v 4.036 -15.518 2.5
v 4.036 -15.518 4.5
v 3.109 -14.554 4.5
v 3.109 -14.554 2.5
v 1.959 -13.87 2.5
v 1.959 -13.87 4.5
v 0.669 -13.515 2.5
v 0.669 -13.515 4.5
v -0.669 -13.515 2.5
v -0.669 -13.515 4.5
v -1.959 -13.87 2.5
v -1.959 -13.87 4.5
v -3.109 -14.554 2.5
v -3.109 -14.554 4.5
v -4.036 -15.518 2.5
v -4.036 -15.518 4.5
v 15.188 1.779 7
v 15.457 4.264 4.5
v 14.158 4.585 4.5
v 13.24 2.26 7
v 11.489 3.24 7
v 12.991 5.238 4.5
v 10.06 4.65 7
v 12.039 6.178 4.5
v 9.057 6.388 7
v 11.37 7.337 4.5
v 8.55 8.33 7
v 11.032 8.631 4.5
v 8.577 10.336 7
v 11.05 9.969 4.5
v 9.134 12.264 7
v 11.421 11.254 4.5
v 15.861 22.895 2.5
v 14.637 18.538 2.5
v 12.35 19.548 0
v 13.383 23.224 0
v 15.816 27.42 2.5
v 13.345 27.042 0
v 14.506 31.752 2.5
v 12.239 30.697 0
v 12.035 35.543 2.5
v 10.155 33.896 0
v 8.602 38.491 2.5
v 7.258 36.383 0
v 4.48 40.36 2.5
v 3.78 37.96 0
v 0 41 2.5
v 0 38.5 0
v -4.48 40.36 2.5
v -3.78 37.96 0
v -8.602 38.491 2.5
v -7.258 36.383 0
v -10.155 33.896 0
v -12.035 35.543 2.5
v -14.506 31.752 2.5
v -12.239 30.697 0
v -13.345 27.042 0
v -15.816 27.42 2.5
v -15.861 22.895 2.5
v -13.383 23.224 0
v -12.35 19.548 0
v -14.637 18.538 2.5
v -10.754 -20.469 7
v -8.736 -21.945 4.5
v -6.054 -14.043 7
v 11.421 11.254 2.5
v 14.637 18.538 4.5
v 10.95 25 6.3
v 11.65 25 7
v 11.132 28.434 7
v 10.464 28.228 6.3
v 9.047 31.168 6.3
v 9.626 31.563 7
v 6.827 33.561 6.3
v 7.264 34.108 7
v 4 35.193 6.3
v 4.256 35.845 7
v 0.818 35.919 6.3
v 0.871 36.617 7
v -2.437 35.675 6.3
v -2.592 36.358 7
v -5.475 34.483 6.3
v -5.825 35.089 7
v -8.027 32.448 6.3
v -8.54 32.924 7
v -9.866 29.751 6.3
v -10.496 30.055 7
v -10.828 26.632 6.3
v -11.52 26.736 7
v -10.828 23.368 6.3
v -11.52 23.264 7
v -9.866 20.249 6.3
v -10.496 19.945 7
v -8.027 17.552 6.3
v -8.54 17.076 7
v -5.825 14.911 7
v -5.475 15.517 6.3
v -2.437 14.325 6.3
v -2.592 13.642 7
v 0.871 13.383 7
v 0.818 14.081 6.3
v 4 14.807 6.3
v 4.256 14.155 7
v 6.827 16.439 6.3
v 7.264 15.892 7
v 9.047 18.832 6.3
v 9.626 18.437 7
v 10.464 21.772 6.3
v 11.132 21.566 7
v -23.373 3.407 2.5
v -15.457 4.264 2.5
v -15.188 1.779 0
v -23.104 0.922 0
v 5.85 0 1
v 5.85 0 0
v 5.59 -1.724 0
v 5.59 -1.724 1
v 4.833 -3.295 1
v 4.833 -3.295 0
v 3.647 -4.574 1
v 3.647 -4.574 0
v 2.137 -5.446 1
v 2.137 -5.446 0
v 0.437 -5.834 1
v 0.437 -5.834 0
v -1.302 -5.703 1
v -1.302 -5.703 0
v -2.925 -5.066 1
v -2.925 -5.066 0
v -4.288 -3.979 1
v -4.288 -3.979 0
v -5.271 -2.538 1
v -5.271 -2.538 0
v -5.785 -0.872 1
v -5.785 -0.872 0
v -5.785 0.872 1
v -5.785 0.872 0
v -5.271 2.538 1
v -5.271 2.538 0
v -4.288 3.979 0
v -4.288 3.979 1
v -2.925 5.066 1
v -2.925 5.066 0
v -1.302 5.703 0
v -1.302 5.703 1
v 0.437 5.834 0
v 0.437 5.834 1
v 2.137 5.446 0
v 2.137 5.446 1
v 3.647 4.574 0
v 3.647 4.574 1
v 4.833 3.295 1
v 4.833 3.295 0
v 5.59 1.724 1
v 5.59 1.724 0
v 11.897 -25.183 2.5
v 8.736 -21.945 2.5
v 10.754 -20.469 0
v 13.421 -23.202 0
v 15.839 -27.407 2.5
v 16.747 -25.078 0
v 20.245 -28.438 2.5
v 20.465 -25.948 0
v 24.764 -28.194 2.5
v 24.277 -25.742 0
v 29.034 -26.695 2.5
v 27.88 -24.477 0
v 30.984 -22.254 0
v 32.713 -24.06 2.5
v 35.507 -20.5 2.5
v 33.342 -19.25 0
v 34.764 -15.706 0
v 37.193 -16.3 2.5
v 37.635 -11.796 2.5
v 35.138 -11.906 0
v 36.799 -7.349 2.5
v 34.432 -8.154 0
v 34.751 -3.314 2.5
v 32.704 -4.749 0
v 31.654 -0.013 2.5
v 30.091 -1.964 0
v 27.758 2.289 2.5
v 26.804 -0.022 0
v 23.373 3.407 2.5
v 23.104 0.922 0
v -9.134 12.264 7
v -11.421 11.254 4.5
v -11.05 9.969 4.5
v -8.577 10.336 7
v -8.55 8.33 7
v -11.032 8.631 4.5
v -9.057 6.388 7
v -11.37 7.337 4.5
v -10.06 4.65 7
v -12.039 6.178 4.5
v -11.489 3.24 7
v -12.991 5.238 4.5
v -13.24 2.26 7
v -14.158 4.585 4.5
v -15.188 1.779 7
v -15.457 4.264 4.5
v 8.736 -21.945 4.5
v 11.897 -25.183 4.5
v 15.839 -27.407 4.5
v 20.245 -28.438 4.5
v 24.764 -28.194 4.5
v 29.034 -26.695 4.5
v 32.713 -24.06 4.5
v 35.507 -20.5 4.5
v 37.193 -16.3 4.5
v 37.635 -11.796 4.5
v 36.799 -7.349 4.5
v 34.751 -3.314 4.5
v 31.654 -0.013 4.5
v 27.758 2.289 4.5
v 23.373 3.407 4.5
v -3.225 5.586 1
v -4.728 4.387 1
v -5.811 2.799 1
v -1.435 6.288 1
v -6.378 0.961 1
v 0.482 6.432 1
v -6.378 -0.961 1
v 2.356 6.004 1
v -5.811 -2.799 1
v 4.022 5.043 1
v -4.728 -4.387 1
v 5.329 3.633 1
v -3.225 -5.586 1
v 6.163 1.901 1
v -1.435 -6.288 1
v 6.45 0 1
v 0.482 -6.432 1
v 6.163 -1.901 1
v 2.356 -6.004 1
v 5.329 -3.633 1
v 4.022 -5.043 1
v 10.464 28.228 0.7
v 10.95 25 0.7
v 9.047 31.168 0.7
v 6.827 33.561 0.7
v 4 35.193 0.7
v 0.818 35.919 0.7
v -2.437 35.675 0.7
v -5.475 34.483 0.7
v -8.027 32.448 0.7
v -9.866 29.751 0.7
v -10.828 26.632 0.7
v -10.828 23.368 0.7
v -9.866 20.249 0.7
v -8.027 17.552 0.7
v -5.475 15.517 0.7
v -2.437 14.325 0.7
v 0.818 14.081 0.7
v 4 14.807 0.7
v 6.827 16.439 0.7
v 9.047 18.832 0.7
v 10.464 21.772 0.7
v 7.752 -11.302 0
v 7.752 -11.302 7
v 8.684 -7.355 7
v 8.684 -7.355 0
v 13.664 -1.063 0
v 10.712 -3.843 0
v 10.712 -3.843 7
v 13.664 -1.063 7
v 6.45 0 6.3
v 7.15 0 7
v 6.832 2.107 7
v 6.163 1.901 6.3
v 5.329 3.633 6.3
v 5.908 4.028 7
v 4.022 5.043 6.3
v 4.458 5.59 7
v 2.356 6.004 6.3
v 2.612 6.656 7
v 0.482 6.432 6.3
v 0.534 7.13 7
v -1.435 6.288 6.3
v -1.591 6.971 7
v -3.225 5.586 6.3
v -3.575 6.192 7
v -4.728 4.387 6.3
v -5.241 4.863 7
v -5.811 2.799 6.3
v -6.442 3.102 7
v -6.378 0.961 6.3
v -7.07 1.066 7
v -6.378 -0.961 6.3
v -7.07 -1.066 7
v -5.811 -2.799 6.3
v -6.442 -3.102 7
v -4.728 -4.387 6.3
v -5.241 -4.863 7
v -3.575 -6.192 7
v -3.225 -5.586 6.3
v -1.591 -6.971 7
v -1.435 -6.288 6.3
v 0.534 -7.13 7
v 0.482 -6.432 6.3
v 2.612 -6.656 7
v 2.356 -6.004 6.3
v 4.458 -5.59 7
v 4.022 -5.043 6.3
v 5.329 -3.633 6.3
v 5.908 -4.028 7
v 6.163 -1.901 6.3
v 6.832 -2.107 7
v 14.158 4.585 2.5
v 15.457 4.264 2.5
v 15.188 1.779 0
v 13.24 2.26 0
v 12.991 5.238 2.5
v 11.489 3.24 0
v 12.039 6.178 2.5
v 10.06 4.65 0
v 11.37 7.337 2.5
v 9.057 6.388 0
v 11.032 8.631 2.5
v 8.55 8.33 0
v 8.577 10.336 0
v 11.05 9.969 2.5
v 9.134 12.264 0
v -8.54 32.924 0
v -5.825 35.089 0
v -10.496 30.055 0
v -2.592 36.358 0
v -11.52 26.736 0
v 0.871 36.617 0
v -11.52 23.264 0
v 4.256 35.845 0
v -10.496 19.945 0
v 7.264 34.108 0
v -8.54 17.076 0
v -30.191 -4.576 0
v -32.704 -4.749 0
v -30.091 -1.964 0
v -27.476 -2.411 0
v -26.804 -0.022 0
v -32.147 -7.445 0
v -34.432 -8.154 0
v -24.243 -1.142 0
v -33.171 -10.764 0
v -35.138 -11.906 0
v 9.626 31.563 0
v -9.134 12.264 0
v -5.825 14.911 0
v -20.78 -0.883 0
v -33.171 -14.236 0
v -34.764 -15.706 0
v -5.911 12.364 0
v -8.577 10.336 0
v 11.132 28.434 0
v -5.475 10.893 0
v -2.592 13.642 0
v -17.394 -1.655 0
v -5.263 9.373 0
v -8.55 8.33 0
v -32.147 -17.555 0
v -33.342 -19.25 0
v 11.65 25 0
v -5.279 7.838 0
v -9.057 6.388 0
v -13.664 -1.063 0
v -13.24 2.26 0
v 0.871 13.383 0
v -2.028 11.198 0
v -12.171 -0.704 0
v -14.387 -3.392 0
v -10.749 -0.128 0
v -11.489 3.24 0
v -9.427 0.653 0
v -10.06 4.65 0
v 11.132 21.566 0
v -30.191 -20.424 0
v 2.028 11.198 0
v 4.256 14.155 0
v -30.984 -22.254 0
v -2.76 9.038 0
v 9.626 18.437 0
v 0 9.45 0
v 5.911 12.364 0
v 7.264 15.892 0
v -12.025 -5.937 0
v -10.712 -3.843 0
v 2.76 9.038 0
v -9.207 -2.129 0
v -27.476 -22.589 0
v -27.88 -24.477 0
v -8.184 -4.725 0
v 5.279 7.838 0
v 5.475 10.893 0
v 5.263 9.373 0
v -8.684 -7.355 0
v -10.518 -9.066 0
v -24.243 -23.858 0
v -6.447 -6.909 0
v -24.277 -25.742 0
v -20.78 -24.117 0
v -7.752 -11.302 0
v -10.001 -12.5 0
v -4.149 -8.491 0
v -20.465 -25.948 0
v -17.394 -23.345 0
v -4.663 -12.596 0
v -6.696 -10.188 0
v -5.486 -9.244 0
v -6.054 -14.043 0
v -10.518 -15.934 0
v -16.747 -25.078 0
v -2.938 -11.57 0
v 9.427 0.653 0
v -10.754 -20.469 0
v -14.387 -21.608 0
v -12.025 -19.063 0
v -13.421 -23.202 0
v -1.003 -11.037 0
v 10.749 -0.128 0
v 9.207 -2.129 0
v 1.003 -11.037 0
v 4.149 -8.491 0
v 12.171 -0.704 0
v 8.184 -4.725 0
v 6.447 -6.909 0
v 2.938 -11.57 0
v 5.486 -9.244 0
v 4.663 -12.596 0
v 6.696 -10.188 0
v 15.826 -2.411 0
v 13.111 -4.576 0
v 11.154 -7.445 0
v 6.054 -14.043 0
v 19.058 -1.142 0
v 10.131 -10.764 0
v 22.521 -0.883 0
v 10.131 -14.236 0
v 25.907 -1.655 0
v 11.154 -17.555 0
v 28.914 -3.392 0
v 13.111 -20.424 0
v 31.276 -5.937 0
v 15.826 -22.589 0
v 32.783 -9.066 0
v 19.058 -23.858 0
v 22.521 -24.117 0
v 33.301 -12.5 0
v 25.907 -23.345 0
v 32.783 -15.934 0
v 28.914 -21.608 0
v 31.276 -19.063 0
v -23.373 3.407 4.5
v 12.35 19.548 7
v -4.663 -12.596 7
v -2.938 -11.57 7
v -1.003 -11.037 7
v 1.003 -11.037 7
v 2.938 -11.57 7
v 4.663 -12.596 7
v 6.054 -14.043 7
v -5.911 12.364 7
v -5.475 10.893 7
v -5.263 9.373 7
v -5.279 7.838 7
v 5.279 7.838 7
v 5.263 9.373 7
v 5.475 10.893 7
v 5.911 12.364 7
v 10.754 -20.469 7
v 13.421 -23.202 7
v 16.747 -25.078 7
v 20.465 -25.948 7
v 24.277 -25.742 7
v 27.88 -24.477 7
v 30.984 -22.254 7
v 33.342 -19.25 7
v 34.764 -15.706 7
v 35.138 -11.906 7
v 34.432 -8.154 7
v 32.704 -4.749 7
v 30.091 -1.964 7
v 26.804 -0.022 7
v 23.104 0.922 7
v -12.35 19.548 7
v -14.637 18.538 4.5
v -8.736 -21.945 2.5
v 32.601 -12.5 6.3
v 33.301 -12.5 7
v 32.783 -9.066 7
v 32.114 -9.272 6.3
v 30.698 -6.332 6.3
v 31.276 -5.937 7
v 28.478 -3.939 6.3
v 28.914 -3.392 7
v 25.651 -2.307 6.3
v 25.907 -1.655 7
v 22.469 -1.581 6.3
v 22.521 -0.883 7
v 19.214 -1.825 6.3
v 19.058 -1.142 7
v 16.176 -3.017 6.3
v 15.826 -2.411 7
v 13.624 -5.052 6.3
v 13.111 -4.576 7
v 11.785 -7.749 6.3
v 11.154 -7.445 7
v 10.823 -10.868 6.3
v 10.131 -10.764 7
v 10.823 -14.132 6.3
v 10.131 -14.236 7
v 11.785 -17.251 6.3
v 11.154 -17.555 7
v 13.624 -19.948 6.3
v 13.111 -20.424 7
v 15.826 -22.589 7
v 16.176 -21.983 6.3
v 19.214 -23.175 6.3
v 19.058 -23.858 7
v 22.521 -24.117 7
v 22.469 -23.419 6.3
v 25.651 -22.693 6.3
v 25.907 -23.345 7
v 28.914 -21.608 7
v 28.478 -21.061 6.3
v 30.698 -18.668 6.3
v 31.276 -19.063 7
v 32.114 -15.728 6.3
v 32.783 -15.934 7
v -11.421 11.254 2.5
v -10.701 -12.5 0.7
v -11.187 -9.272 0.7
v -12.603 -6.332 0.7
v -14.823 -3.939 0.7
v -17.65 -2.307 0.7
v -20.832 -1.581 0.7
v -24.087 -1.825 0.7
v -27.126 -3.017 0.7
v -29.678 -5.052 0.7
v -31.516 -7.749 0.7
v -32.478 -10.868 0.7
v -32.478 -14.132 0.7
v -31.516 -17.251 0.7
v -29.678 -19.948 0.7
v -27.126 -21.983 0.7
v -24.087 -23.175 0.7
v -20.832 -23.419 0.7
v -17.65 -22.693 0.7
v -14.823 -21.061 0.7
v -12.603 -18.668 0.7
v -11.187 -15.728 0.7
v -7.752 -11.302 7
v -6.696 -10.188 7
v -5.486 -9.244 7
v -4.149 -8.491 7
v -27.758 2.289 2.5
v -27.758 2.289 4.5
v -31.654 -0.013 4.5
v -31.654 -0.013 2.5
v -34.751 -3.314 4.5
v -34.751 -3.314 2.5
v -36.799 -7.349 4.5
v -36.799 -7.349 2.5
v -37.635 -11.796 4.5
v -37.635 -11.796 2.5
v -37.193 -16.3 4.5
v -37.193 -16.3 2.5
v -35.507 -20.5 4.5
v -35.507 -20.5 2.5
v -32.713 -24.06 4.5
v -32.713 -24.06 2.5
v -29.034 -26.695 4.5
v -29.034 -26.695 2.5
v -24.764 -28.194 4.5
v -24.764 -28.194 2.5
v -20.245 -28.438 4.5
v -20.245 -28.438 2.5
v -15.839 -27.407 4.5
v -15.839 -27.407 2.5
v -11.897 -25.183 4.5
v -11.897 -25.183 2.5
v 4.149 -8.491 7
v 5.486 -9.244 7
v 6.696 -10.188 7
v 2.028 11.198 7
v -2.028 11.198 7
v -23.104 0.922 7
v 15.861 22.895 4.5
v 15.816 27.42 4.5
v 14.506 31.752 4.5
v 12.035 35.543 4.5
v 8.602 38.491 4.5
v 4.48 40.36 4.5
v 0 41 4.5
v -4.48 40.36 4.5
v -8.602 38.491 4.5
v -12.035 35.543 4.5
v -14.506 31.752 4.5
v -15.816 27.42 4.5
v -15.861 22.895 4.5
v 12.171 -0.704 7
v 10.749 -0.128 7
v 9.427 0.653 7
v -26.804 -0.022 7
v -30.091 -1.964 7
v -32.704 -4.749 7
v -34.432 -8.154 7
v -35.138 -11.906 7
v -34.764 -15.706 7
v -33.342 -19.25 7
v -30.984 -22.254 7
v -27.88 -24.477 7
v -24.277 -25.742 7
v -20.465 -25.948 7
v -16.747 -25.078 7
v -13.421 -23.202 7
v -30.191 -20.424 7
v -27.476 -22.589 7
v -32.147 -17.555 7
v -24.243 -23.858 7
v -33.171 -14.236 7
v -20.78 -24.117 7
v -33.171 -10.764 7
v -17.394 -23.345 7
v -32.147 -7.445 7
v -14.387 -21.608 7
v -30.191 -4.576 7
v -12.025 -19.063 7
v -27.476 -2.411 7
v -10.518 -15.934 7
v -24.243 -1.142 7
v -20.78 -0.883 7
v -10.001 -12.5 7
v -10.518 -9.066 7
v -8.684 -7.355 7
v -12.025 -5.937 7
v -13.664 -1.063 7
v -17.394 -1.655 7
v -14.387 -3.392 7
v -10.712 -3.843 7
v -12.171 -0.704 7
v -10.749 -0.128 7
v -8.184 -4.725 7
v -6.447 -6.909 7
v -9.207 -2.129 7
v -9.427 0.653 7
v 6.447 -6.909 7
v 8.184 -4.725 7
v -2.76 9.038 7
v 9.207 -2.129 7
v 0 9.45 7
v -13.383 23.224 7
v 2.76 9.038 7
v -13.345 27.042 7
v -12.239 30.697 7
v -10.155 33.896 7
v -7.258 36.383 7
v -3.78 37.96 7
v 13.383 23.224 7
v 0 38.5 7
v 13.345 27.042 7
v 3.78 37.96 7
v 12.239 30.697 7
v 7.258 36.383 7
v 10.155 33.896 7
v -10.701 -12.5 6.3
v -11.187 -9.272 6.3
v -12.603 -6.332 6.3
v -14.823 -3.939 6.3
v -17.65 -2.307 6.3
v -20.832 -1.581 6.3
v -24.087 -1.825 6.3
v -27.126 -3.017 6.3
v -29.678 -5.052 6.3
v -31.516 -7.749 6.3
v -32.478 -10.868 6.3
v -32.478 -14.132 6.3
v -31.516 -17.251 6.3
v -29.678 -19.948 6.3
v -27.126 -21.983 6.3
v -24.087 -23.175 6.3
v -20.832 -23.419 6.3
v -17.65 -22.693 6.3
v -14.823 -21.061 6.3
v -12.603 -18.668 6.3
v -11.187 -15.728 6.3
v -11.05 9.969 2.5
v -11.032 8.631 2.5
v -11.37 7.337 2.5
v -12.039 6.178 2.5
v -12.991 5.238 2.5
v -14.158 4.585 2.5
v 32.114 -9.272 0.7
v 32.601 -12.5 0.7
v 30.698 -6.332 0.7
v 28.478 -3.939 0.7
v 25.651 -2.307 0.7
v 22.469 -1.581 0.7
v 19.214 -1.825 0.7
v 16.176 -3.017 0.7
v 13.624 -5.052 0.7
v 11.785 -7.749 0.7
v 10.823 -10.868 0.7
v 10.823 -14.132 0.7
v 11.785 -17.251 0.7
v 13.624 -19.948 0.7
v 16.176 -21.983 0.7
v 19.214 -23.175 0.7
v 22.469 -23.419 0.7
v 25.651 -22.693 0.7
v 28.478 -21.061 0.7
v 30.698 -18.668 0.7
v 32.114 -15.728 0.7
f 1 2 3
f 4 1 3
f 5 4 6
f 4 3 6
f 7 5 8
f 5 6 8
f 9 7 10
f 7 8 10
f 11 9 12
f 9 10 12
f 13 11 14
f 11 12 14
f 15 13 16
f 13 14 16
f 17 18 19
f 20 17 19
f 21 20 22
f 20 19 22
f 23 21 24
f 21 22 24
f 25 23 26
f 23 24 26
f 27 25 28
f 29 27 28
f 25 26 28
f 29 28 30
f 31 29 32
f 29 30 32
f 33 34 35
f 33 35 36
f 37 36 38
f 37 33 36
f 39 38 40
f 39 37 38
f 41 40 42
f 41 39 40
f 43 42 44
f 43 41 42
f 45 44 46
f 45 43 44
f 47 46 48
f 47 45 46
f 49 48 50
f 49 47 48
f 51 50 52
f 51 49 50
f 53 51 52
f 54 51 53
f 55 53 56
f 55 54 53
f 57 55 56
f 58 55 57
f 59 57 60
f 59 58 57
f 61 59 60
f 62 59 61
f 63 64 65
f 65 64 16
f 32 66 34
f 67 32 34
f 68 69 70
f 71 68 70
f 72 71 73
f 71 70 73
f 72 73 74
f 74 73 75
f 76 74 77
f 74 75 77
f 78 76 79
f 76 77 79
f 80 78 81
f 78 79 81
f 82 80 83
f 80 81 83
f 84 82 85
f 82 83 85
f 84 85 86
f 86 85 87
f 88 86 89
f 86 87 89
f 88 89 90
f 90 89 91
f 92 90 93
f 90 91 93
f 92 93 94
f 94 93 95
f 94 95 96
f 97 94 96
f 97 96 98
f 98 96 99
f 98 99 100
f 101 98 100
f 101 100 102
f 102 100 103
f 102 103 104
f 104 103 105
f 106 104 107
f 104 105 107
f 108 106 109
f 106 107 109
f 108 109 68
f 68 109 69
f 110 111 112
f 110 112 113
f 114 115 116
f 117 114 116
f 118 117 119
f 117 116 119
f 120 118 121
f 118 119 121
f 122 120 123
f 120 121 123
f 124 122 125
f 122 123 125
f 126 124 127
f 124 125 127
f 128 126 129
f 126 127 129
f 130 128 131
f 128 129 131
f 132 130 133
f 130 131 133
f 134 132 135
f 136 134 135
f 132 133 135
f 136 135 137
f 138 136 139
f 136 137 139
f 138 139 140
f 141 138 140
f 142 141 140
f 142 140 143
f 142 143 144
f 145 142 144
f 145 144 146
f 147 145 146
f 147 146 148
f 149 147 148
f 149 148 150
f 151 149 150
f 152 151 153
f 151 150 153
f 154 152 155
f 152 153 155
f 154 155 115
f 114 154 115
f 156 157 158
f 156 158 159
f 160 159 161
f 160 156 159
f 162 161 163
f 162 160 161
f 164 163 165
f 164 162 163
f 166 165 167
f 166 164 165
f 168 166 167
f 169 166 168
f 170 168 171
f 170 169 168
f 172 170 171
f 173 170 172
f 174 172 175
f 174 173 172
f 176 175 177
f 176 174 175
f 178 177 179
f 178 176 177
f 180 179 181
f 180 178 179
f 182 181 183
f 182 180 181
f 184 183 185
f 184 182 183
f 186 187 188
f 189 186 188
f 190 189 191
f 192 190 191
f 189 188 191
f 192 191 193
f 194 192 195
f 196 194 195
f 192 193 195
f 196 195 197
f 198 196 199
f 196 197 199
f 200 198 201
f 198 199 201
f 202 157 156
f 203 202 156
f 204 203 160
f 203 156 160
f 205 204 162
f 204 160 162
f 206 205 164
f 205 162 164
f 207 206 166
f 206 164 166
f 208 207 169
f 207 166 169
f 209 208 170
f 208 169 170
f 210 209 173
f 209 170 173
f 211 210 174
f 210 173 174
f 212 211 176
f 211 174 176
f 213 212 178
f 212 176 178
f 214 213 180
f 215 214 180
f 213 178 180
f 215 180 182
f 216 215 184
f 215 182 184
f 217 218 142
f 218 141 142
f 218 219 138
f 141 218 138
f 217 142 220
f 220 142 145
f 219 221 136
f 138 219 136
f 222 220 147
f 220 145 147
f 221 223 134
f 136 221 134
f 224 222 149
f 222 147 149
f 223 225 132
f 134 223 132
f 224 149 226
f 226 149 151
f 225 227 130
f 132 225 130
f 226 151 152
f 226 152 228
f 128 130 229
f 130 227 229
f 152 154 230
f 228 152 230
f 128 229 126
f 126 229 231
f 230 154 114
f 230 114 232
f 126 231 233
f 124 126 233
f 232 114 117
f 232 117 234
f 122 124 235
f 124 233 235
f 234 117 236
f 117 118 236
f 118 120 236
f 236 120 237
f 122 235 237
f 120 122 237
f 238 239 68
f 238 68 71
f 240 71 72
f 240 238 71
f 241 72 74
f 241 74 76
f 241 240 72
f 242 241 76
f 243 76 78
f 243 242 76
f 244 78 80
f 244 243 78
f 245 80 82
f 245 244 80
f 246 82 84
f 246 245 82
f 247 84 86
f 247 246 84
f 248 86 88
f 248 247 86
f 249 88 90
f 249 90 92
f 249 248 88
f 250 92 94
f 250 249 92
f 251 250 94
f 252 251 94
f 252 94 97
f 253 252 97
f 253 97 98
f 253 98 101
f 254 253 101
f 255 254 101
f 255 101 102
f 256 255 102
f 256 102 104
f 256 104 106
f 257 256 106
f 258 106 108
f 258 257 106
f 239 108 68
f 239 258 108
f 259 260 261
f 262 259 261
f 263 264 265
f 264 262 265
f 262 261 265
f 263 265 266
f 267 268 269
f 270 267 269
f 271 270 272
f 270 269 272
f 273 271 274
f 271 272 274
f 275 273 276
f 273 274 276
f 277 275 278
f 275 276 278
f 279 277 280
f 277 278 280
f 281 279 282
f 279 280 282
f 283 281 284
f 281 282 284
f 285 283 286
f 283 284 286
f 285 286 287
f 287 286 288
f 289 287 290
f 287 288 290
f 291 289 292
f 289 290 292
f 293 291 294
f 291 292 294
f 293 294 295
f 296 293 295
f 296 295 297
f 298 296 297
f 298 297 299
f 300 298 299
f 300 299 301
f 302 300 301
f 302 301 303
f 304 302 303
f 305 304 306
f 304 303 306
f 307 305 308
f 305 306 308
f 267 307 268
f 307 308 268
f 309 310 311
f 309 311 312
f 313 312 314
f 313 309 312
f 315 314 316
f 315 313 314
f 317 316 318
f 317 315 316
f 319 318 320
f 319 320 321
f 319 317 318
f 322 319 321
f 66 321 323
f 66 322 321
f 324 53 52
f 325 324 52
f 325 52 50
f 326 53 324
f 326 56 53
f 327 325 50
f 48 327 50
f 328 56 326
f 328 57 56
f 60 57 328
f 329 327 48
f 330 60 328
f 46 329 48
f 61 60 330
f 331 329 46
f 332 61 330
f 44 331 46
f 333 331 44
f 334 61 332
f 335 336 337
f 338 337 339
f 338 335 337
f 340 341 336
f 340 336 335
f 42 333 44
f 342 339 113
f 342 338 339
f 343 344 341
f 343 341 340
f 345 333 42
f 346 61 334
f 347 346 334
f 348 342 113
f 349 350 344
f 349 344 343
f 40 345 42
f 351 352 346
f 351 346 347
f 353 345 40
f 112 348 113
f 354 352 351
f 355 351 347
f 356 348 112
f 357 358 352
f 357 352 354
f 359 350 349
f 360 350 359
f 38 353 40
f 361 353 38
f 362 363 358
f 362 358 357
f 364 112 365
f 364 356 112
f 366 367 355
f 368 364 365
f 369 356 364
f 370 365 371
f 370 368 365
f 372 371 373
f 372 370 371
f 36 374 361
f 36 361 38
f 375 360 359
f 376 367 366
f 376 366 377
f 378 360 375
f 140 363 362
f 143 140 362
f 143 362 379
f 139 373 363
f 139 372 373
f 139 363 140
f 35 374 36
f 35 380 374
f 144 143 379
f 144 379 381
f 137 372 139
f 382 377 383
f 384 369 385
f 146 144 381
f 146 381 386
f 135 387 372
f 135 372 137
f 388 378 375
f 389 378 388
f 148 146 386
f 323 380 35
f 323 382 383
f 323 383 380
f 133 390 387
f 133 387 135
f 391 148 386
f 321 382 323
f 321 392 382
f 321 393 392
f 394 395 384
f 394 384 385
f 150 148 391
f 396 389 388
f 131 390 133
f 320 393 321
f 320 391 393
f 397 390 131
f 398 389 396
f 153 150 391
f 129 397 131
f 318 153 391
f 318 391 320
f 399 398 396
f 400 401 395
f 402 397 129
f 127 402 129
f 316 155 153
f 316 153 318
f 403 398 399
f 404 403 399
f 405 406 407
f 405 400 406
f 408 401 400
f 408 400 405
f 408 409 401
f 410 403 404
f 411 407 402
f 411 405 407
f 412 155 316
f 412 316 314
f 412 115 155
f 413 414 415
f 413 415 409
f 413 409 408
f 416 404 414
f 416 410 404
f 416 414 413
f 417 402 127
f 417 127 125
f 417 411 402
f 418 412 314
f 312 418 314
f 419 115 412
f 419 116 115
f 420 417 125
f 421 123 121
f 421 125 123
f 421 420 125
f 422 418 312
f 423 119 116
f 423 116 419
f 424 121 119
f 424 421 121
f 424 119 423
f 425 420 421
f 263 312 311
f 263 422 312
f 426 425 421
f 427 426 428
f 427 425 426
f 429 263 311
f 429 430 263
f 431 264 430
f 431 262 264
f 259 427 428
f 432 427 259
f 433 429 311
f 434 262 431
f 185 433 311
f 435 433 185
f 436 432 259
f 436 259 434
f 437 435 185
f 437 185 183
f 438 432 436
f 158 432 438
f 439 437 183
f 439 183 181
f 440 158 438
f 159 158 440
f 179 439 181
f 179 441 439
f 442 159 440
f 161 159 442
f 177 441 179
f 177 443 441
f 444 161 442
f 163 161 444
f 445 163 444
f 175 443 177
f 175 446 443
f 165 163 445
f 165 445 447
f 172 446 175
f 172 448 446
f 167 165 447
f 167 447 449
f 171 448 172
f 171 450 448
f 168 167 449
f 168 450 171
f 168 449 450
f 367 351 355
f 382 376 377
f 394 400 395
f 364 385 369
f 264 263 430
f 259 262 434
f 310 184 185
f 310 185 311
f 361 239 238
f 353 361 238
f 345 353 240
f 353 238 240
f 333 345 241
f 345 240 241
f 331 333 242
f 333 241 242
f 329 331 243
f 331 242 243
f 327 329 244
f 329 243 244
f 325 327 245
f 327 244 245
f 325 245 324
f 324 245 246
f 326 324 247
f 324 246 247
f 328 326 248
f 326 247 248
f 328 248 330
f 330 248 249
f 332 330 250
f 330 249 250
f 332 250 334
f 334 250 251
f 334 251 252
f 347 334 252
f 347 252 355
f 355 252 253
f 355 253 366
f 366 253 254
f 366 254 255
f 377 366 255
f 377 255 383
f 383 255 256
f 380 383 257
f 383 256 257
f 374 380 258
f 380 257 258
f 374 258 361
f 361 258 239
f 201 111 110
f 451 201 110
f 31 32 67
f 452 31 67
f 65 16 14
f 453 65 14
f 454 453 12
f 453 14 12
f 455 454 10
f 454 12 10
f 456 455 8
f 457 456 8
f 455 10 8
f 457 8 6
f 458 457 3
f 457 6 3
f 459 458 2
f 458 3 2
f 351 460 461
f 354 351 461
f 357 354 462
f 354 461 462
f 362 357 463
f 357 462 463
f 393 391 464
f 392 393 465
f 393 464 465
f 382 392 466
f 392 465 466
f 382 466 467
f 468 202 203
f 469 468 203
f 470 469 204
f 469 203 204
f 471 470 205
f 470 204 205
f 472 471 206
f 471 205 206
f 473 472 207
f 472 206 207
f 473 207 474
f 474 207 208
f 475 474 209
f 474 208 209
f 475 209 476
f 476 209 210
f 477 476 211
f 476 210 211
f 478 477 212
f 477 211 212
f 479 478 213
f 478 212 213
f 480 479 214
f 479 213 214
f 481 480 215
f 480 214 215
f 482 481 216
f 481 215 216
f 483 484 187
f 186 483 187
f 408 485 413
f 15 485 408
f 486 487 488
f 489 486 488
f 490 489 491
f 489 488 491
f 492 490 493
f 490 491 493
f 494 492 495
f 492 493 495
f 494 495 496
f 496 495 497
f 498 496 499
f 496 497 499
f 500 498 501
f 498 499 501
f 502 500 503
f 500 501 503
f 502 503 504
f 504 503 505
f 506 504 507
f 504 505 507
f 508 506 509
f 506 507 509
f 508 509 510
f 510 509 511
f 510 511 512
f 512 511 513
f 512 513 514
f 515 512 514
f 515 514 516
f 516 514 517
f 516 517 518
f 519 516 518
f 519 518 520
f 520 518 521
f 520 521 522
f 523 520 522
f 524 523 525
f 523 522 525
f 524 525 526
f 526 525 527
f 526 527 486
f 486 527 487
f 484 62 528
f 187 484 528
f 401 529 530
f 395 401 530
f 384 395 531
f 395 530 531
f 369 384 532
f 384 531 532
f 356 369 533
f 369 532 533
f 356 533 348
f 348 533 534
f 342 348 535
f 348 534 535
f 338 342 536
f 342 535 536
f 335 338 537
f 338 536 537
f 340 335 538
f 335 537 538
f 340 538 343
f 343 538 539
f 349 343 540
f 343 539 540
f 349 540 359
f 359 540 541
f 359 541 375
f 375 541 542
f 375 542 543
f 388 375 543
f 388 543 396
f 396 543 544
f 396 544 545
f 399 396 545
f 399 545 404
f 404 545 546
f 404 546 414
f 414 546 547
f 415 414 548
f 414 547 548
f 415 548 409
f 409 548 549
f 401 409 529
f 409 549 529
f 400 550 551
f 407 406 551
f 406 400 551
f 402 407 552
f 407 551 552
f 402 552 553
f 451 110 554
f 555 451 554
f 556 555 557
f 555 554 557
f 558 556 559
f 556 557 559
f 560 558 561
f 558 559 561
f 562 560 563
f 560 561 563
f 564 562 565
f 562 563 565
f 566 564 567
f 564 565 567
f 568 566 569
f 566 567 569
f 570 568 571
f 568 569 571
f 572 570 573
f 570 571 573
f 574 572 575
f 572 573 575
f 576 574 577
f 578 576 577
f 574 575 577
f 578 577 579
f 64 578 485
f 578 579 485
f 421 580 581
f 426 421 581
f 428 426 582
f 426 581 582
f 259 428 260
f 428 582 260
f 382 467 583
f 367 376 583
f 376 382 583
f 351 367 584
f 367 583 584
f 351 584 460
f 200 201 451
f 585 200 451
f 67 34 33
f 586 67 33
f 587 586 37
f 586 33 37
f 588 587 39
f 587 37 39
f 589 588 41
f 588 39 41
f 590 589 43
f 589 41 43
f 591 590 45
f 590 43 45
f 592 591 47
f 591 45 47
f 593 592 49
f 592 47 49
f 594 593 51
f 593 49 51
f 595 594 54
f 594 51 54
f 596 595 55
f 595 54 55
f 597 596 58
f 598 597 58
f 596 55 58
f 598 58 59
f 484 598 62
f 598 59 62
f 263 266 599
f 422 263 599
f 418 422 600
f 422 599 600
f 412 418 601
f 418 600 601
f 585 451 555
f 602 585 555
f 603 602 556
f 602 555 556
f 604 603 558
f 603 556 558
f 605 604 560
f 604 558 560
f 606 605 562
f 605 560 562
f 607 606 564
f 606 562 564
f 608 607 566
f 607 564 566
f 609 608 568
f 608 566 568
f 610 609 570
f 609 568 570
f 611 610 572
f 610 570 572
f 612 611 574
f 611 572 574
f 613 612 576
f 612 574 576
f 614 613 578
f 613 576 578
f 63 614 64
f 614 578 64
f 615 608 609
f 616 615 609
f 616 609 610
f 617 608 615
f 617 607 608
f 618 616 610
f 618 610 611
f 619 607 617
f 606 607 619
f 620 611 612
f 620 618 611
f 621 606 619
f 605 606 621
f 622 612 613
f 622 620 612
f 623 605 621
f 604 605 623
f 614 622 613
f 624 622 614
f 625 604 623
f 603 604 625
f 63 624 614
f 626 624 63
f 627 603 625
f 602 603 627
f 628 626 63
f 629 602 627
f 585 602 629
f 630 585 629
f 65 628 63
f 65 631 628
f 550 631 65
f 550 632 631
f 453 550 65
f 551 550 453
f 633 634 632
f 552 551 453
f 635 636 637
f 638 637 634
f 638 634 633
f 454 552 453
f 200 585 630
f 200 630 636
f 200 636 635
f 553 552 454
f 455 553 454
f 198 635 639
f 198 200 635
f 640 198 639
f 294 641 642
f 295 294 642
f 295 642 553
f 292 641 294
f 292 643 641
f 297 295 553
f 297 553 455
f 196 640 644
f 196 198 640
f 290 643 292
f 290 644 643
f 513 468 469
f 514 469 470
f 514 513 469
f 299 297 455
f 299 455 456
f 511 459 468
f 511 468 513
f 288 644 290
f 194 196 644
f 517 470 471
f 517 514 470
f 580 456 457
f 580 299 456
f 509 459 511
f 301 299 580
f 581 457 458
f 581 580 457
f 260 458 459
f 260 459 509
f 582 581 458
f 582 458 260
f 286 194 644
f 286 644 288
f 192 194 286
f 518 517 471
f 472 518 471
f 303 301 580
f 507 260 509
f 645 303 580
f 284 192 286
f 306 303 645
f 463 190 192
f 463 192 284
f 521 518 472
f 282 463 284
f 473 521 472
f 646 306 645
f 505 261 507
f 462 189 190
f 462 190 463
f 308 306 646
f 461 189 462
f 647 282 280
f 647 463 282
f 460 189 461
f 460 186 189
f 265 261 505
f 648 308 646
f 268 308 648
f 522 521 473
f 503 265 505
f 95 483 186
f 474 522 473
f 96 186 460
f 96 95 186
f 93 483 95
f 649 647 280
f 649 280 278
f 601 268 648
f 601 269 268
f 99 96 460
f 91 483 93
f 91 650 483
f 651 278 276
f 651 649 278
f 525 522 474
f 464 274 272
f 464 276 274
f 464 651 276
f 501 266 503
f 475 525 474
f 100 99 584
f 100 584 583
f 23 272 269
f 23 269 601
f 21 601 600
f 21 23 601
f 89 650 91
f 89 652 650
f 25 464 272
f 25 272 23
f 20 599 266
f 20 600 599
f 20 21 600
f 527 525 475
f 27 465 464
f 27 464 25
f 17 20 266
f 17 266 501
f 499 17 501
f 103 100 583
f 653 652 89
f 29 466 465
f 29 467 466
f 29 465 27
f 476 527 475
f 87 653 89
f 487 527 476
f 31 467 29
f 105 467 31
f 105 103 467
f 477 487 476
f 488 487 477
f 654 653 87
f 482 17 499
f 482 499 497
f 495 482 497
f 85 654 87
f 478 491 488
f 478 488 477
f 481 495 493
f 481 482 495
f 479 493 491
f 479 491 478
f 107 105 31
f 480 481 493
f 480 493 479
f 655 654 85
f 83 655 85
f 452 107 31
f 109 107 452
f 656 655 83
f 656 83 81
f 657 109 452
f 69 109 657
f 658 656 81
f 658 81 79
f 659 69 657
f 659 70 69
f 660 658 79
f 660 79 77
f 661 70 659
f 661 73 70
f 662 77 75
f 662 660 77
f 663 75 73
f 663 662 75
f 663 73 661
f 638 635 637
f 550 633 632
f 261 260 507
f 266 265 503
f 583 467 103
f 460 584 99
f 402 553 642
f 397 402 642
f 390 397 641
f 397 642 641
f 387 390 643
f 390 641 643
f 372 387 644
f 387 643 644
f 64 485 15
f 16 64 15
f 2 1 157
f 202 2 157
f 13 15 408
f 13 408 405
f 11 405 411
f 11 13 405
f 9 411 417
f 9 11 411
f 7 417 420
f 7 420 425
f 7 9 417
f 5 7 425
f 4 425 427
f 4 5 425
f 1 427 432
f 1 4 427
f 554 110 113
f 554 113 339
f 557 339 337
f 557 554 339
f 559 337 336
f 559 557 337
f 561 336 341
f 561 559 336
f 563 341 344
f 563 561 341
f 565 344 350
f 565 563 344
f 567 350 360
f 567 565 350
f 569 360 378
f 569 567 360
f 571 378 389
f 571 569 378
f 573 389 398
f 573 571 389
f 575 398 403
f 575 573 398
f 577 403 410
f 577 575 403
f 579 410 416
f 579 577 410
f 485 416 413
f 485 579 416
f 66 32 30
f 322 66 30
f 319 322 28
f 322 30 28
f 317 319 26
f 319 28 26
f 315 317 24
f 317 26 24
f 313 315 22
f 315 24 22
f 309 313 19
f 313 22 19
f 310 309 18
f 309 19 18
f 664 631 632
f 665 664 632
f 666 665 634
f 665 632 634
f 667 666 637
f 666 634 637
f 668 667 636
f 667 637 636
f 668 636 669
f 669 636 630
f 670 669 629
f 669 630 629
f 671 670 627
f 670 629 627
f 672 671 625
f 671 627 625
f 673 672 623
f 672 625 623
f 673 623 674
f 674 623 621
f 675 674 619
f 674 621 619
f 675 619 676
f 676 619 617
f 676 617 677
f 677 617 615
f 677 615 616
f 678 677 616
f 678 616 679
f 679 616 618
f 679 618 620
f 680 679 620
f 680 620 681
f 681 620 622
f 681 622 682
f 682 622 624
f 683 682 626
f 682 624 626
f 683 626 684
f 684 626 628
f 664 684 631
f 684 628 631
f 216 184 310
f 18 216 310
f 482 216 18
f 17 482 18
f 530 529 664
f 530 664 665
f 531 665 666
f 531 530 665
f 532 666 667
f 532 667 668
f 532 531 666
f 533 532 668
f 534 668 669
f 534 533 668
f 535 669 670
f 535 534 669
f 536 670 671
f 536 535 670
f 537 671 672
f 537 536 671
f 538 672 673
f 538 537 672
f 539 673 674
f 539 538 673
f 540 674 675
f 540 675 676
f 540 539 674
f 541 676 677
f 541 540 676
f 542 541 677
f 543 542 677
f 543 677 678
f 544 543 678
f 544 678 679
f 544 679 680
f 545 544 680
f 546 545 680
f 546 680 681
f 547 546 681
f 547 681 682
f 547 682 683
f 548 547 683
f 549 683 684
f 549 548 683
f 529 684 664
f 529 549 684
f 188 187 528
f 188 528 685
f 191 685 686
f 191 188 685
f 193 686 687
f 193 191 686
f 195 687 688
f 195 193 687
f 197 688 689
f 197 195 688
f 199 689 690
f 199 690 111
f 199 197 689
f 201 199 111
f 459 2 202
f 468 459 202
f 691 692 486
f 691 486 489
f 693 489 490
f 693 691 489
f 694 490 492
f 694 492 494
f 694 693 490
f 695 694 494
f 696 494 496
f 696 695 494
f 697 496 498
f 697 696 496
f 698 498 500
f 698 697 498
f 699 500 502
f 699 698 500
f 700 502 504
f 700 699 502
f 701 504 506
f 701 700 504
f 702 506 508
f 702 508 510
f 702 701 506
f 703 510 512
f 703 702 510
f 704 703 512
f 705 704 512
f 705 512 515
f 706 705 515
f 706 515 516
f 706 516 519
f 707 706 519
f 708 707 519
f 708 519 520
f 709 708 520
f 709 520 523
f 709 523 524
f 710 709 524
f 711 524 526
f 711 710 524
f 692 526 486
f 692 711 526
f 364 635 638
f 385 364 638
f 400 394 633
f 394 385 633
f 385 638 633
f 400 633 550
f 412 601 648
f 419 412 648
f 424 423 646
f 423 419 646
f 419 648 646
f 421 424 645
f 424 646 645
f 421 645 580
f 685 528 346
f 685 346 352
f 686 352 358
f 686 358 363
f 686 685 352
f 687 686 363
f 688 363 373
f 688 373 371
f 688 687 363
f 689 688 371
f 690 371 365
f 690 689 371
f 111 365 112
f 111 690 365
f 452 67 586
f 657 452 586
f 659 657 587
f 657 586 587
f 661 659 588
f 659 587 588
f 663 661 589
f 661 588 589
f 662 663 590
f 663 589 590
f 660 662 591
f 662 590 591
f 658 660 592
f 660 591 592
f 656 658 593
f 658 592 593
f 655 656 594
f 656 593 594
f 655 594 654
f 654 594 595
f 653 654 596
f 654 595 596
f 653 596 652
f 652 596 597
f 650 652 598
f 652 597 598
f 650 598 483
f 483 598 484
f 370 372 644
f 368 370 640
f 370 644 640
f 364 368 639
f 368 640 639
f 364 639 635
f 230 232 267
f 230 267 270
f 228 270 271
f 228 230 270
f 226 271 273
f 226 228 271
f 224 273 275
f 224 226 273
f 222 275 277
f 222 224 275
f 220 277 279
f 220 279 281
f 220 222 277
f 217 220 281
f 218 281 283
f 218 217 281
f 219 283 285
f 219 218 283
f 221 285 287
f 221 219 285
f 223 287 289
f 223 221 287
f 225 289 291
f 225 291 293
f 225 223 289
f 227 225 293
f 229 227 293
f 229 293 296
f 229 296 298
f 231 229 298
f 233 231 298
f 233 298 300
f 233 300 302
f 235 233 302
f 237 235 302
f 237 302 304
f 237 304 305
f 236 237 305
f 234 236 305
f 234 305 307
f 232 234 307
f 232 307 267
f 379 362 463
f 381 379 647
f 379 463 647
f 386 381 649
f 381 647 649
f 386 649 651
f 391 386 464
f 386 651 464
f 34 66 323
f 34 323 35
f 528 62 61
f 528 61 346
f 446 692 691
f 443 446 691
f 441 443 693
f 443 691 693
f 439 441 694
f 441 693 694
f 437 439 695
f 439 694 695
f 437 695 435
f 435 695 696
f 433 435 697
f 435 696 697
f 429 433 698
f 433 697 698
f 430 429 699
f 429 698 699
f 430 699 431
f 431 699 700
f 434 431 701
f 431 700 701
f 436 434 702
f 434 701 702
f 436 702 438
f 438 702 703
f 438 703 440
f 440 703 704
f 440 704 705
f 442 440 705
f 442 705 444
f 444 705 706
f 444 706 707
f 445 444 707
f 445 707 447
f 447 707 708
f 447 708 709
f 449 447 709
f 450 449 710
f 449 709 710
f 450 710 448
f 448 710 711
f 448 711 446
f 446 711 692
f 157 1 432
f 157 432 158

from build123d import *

# Parameters (mm, degrees)
F0_R     = 10.95
F0_R_2   = 6.45
F1_DEPTH = 7
F2_R     = 5
F3_SIZE  = 2.5
F4_R     = 6.45
F4_R_2   = 5.85
F5_DEPTH = 1
F6_SIZE  = 0.7
F8_DEPTH = 25


with BuildPart() as f1:
    # F0 (on Top) → F1 (new body)
    with BuildSketch(Plane.XY):
        with BuildLine():
            Line((8.6602540378, 5), (14.6370370137, 18.538022945))
            ThreePointArc((14.6370370137, 18.538022945), (0, 41), (-14.6370370137, 18.538022945))
            Line((-14.6370370137, 18.538022945), (-8.6602540378, 5))
            Line((-8.6602540378, 5), (-23.3729173132, 3.4070344175))
            ThreePointArc((-23.3729173132, 3.4070344175), (-35.5070415552, -20.5), (-8.7358802995, -21.9450573625))
            Line((-8.7358802995, -21.9450573625), (0, -10))
            Line((0, -10), (8.7358802995, -21.9450573625))
            ThreePointArc((8.7358802995, -21.9450573625), (35.5070415552, -20.5), (23.3729173132, 3.4070344175))
            Line((23.3729173132, 3.4070344175), (8.6602540378, 5))
        make_face()
        with Locations((-21.6506350946, -12.5)):
            Circle(F0_R, mode=Mode.SUBTRACT)
        with Locations((21.6506350946, -12.5)):
            Circle(F0_R, mode=Mode.SUBTRACT)
        Circle(F0_R_2, mode=Mode.SUBTRACT)
        with Locations((0, 25)):
            Circle(F0_R, mode=Mode.SUBTRACT)
    extrude(amount=F1_DEPTH)

    # F2
    f2_edges = [f1.edges().sort_by_distance(p)[0] for p in [
        (0, -10, 3.5),
        (8.660254, 5, 3.5),
        (-8.660254, 5, 3.5),
    ]]
    fillet(f2_edges, radius=F2_R)

    # F3
    f3_edges = [f1.edges().sort_by_distance(p)[0] for p in [
        (-19.415113, 3.835553, 7),
        (-6.385871, -18.731758, 0),
        (19.415113, 3.835553, 0),
        (19.415113, 3.835553, 7),
        (11.665396, 6.735019, 0),
        (35.507042, -20.5, 0),
        (13.029243, 14.896205, 0),
        (6.385871, -18.731758, 0),
        (0, 41, 0),
        (0, -13.470039, 0),
        (-13.029243, 14.896205, 0),
        (-11.665396, 6.735019, 0),
        (-35.507042, -20.5, 0),
        (-19.415113, 3.835553, 0),
        (11.665396, 6.735019, 7),
        (35.507042, -20.5, 7),
        (13.029243, 14.896205, 7),
        (6.385871, -18.731758, 7),
        (0, 41, 7),
        (0, -13.470039, 7),
        (-13.029243, 14.896205, 7),
        (-6.385871, -18.731758, 7),
        (-11.665396, 6.735019, 7),
        (-35.507042, -20.5, 7),
    ]]
    chamfer(f3_edges, length=F3_SIZE)

    # F4 (on face) → F5 (join)
    with BuildSketch(Plane(origin=(0, 0, 0), x_dir=(1, 0, 0), z_dir=(0, 0, -1))):
        Circle(F4_R)
        Circle(F4_R_2, mode=Mode.SUBTRACT)
    extrude(amount=-F5_DEPTH)

    # F6
    f6_edges = [f1.edges().sort_by_distance(p)[0] for p in [
        (-6.45, 0, 7),
        (-32.600635, -12.5, 7),
        (10.700635, -12.5, 7),
        (-10.95, 25, 7),
        (-32.600635, -12.5, 0),
        (10.700635, -12.5, 0),
        (-10.95, 25, 0),
    ]]
    chamfer(f6_edges, length=F6_SIZE)

    # F7 (on face) → F8 (cut)
    with BuildSketch(Plane.XY.offset(7)):
        with BuildLine():
            ThreePointArc((-4.1486247409, -8.4906662141), (-8.1839400658, -4.725), (-9.4274450069, 0.6525186907))
            ThreePointArc((-9.4274450069, 0.6525186907), (-11.4491842198, -0.4430009845), (-13.6635486442, -1.0628259595))
            ThreePointArc((-13.6635486442, -1.0628259595), (-9.5695807118, -5.525), (-7.7522086028, -11.3015672519))
            ThreePointArc((-7.7522086028, -11.3015672519), (-6.1082422164, -9.6937838947), (-4.1486247409, -8.4906662141))
        make_face()
        with BuildLine():
            ThreePointArc((-5.278820266, 7.8381475234), (0, 9.45), (5.278820266, 7.8381475234))
            ThreePointArc((5.278820266, 7.8381475234), (5.3409420034, 10.1367848792), (5.9113400414, 12.3643932114))
            ThreePointArc((5.9113400414, 12.3643932114), (0, 11.05), (-5.9113400414, 12.3643932114))
            ThreePointArc((-5.9113400414, 12.3643932114), (-5.3409420034, 10.1367848792), (-5.278820266, 7.8381475234))
        make_face()
        with BuildLine():
            ThreePointArc((9.4274450069, 0.6525186907), (8.1839400658, -4.725), (4.1486247409, -8.4906662141))
            ThreePointArc((4.1486247409, -8.4906662141), (6.1082422164, -9.6937838947), (7.7522086028, -11.3015672519))
            ThreePointArc((7.7522086028, -11.3015672519), (9.5695807118, -5.525), (13.6635486442, -1.0628259595))
            ThreePointArc((13.6635486442, -1.0628259595), (11.4491842198, -0.4430009845), (9.4274450069, 0.6525186907))
        make_face()
    extrude(amount=-F8_DEPTH, mode=Mode.SUBTRACT)


solid = f1.part
